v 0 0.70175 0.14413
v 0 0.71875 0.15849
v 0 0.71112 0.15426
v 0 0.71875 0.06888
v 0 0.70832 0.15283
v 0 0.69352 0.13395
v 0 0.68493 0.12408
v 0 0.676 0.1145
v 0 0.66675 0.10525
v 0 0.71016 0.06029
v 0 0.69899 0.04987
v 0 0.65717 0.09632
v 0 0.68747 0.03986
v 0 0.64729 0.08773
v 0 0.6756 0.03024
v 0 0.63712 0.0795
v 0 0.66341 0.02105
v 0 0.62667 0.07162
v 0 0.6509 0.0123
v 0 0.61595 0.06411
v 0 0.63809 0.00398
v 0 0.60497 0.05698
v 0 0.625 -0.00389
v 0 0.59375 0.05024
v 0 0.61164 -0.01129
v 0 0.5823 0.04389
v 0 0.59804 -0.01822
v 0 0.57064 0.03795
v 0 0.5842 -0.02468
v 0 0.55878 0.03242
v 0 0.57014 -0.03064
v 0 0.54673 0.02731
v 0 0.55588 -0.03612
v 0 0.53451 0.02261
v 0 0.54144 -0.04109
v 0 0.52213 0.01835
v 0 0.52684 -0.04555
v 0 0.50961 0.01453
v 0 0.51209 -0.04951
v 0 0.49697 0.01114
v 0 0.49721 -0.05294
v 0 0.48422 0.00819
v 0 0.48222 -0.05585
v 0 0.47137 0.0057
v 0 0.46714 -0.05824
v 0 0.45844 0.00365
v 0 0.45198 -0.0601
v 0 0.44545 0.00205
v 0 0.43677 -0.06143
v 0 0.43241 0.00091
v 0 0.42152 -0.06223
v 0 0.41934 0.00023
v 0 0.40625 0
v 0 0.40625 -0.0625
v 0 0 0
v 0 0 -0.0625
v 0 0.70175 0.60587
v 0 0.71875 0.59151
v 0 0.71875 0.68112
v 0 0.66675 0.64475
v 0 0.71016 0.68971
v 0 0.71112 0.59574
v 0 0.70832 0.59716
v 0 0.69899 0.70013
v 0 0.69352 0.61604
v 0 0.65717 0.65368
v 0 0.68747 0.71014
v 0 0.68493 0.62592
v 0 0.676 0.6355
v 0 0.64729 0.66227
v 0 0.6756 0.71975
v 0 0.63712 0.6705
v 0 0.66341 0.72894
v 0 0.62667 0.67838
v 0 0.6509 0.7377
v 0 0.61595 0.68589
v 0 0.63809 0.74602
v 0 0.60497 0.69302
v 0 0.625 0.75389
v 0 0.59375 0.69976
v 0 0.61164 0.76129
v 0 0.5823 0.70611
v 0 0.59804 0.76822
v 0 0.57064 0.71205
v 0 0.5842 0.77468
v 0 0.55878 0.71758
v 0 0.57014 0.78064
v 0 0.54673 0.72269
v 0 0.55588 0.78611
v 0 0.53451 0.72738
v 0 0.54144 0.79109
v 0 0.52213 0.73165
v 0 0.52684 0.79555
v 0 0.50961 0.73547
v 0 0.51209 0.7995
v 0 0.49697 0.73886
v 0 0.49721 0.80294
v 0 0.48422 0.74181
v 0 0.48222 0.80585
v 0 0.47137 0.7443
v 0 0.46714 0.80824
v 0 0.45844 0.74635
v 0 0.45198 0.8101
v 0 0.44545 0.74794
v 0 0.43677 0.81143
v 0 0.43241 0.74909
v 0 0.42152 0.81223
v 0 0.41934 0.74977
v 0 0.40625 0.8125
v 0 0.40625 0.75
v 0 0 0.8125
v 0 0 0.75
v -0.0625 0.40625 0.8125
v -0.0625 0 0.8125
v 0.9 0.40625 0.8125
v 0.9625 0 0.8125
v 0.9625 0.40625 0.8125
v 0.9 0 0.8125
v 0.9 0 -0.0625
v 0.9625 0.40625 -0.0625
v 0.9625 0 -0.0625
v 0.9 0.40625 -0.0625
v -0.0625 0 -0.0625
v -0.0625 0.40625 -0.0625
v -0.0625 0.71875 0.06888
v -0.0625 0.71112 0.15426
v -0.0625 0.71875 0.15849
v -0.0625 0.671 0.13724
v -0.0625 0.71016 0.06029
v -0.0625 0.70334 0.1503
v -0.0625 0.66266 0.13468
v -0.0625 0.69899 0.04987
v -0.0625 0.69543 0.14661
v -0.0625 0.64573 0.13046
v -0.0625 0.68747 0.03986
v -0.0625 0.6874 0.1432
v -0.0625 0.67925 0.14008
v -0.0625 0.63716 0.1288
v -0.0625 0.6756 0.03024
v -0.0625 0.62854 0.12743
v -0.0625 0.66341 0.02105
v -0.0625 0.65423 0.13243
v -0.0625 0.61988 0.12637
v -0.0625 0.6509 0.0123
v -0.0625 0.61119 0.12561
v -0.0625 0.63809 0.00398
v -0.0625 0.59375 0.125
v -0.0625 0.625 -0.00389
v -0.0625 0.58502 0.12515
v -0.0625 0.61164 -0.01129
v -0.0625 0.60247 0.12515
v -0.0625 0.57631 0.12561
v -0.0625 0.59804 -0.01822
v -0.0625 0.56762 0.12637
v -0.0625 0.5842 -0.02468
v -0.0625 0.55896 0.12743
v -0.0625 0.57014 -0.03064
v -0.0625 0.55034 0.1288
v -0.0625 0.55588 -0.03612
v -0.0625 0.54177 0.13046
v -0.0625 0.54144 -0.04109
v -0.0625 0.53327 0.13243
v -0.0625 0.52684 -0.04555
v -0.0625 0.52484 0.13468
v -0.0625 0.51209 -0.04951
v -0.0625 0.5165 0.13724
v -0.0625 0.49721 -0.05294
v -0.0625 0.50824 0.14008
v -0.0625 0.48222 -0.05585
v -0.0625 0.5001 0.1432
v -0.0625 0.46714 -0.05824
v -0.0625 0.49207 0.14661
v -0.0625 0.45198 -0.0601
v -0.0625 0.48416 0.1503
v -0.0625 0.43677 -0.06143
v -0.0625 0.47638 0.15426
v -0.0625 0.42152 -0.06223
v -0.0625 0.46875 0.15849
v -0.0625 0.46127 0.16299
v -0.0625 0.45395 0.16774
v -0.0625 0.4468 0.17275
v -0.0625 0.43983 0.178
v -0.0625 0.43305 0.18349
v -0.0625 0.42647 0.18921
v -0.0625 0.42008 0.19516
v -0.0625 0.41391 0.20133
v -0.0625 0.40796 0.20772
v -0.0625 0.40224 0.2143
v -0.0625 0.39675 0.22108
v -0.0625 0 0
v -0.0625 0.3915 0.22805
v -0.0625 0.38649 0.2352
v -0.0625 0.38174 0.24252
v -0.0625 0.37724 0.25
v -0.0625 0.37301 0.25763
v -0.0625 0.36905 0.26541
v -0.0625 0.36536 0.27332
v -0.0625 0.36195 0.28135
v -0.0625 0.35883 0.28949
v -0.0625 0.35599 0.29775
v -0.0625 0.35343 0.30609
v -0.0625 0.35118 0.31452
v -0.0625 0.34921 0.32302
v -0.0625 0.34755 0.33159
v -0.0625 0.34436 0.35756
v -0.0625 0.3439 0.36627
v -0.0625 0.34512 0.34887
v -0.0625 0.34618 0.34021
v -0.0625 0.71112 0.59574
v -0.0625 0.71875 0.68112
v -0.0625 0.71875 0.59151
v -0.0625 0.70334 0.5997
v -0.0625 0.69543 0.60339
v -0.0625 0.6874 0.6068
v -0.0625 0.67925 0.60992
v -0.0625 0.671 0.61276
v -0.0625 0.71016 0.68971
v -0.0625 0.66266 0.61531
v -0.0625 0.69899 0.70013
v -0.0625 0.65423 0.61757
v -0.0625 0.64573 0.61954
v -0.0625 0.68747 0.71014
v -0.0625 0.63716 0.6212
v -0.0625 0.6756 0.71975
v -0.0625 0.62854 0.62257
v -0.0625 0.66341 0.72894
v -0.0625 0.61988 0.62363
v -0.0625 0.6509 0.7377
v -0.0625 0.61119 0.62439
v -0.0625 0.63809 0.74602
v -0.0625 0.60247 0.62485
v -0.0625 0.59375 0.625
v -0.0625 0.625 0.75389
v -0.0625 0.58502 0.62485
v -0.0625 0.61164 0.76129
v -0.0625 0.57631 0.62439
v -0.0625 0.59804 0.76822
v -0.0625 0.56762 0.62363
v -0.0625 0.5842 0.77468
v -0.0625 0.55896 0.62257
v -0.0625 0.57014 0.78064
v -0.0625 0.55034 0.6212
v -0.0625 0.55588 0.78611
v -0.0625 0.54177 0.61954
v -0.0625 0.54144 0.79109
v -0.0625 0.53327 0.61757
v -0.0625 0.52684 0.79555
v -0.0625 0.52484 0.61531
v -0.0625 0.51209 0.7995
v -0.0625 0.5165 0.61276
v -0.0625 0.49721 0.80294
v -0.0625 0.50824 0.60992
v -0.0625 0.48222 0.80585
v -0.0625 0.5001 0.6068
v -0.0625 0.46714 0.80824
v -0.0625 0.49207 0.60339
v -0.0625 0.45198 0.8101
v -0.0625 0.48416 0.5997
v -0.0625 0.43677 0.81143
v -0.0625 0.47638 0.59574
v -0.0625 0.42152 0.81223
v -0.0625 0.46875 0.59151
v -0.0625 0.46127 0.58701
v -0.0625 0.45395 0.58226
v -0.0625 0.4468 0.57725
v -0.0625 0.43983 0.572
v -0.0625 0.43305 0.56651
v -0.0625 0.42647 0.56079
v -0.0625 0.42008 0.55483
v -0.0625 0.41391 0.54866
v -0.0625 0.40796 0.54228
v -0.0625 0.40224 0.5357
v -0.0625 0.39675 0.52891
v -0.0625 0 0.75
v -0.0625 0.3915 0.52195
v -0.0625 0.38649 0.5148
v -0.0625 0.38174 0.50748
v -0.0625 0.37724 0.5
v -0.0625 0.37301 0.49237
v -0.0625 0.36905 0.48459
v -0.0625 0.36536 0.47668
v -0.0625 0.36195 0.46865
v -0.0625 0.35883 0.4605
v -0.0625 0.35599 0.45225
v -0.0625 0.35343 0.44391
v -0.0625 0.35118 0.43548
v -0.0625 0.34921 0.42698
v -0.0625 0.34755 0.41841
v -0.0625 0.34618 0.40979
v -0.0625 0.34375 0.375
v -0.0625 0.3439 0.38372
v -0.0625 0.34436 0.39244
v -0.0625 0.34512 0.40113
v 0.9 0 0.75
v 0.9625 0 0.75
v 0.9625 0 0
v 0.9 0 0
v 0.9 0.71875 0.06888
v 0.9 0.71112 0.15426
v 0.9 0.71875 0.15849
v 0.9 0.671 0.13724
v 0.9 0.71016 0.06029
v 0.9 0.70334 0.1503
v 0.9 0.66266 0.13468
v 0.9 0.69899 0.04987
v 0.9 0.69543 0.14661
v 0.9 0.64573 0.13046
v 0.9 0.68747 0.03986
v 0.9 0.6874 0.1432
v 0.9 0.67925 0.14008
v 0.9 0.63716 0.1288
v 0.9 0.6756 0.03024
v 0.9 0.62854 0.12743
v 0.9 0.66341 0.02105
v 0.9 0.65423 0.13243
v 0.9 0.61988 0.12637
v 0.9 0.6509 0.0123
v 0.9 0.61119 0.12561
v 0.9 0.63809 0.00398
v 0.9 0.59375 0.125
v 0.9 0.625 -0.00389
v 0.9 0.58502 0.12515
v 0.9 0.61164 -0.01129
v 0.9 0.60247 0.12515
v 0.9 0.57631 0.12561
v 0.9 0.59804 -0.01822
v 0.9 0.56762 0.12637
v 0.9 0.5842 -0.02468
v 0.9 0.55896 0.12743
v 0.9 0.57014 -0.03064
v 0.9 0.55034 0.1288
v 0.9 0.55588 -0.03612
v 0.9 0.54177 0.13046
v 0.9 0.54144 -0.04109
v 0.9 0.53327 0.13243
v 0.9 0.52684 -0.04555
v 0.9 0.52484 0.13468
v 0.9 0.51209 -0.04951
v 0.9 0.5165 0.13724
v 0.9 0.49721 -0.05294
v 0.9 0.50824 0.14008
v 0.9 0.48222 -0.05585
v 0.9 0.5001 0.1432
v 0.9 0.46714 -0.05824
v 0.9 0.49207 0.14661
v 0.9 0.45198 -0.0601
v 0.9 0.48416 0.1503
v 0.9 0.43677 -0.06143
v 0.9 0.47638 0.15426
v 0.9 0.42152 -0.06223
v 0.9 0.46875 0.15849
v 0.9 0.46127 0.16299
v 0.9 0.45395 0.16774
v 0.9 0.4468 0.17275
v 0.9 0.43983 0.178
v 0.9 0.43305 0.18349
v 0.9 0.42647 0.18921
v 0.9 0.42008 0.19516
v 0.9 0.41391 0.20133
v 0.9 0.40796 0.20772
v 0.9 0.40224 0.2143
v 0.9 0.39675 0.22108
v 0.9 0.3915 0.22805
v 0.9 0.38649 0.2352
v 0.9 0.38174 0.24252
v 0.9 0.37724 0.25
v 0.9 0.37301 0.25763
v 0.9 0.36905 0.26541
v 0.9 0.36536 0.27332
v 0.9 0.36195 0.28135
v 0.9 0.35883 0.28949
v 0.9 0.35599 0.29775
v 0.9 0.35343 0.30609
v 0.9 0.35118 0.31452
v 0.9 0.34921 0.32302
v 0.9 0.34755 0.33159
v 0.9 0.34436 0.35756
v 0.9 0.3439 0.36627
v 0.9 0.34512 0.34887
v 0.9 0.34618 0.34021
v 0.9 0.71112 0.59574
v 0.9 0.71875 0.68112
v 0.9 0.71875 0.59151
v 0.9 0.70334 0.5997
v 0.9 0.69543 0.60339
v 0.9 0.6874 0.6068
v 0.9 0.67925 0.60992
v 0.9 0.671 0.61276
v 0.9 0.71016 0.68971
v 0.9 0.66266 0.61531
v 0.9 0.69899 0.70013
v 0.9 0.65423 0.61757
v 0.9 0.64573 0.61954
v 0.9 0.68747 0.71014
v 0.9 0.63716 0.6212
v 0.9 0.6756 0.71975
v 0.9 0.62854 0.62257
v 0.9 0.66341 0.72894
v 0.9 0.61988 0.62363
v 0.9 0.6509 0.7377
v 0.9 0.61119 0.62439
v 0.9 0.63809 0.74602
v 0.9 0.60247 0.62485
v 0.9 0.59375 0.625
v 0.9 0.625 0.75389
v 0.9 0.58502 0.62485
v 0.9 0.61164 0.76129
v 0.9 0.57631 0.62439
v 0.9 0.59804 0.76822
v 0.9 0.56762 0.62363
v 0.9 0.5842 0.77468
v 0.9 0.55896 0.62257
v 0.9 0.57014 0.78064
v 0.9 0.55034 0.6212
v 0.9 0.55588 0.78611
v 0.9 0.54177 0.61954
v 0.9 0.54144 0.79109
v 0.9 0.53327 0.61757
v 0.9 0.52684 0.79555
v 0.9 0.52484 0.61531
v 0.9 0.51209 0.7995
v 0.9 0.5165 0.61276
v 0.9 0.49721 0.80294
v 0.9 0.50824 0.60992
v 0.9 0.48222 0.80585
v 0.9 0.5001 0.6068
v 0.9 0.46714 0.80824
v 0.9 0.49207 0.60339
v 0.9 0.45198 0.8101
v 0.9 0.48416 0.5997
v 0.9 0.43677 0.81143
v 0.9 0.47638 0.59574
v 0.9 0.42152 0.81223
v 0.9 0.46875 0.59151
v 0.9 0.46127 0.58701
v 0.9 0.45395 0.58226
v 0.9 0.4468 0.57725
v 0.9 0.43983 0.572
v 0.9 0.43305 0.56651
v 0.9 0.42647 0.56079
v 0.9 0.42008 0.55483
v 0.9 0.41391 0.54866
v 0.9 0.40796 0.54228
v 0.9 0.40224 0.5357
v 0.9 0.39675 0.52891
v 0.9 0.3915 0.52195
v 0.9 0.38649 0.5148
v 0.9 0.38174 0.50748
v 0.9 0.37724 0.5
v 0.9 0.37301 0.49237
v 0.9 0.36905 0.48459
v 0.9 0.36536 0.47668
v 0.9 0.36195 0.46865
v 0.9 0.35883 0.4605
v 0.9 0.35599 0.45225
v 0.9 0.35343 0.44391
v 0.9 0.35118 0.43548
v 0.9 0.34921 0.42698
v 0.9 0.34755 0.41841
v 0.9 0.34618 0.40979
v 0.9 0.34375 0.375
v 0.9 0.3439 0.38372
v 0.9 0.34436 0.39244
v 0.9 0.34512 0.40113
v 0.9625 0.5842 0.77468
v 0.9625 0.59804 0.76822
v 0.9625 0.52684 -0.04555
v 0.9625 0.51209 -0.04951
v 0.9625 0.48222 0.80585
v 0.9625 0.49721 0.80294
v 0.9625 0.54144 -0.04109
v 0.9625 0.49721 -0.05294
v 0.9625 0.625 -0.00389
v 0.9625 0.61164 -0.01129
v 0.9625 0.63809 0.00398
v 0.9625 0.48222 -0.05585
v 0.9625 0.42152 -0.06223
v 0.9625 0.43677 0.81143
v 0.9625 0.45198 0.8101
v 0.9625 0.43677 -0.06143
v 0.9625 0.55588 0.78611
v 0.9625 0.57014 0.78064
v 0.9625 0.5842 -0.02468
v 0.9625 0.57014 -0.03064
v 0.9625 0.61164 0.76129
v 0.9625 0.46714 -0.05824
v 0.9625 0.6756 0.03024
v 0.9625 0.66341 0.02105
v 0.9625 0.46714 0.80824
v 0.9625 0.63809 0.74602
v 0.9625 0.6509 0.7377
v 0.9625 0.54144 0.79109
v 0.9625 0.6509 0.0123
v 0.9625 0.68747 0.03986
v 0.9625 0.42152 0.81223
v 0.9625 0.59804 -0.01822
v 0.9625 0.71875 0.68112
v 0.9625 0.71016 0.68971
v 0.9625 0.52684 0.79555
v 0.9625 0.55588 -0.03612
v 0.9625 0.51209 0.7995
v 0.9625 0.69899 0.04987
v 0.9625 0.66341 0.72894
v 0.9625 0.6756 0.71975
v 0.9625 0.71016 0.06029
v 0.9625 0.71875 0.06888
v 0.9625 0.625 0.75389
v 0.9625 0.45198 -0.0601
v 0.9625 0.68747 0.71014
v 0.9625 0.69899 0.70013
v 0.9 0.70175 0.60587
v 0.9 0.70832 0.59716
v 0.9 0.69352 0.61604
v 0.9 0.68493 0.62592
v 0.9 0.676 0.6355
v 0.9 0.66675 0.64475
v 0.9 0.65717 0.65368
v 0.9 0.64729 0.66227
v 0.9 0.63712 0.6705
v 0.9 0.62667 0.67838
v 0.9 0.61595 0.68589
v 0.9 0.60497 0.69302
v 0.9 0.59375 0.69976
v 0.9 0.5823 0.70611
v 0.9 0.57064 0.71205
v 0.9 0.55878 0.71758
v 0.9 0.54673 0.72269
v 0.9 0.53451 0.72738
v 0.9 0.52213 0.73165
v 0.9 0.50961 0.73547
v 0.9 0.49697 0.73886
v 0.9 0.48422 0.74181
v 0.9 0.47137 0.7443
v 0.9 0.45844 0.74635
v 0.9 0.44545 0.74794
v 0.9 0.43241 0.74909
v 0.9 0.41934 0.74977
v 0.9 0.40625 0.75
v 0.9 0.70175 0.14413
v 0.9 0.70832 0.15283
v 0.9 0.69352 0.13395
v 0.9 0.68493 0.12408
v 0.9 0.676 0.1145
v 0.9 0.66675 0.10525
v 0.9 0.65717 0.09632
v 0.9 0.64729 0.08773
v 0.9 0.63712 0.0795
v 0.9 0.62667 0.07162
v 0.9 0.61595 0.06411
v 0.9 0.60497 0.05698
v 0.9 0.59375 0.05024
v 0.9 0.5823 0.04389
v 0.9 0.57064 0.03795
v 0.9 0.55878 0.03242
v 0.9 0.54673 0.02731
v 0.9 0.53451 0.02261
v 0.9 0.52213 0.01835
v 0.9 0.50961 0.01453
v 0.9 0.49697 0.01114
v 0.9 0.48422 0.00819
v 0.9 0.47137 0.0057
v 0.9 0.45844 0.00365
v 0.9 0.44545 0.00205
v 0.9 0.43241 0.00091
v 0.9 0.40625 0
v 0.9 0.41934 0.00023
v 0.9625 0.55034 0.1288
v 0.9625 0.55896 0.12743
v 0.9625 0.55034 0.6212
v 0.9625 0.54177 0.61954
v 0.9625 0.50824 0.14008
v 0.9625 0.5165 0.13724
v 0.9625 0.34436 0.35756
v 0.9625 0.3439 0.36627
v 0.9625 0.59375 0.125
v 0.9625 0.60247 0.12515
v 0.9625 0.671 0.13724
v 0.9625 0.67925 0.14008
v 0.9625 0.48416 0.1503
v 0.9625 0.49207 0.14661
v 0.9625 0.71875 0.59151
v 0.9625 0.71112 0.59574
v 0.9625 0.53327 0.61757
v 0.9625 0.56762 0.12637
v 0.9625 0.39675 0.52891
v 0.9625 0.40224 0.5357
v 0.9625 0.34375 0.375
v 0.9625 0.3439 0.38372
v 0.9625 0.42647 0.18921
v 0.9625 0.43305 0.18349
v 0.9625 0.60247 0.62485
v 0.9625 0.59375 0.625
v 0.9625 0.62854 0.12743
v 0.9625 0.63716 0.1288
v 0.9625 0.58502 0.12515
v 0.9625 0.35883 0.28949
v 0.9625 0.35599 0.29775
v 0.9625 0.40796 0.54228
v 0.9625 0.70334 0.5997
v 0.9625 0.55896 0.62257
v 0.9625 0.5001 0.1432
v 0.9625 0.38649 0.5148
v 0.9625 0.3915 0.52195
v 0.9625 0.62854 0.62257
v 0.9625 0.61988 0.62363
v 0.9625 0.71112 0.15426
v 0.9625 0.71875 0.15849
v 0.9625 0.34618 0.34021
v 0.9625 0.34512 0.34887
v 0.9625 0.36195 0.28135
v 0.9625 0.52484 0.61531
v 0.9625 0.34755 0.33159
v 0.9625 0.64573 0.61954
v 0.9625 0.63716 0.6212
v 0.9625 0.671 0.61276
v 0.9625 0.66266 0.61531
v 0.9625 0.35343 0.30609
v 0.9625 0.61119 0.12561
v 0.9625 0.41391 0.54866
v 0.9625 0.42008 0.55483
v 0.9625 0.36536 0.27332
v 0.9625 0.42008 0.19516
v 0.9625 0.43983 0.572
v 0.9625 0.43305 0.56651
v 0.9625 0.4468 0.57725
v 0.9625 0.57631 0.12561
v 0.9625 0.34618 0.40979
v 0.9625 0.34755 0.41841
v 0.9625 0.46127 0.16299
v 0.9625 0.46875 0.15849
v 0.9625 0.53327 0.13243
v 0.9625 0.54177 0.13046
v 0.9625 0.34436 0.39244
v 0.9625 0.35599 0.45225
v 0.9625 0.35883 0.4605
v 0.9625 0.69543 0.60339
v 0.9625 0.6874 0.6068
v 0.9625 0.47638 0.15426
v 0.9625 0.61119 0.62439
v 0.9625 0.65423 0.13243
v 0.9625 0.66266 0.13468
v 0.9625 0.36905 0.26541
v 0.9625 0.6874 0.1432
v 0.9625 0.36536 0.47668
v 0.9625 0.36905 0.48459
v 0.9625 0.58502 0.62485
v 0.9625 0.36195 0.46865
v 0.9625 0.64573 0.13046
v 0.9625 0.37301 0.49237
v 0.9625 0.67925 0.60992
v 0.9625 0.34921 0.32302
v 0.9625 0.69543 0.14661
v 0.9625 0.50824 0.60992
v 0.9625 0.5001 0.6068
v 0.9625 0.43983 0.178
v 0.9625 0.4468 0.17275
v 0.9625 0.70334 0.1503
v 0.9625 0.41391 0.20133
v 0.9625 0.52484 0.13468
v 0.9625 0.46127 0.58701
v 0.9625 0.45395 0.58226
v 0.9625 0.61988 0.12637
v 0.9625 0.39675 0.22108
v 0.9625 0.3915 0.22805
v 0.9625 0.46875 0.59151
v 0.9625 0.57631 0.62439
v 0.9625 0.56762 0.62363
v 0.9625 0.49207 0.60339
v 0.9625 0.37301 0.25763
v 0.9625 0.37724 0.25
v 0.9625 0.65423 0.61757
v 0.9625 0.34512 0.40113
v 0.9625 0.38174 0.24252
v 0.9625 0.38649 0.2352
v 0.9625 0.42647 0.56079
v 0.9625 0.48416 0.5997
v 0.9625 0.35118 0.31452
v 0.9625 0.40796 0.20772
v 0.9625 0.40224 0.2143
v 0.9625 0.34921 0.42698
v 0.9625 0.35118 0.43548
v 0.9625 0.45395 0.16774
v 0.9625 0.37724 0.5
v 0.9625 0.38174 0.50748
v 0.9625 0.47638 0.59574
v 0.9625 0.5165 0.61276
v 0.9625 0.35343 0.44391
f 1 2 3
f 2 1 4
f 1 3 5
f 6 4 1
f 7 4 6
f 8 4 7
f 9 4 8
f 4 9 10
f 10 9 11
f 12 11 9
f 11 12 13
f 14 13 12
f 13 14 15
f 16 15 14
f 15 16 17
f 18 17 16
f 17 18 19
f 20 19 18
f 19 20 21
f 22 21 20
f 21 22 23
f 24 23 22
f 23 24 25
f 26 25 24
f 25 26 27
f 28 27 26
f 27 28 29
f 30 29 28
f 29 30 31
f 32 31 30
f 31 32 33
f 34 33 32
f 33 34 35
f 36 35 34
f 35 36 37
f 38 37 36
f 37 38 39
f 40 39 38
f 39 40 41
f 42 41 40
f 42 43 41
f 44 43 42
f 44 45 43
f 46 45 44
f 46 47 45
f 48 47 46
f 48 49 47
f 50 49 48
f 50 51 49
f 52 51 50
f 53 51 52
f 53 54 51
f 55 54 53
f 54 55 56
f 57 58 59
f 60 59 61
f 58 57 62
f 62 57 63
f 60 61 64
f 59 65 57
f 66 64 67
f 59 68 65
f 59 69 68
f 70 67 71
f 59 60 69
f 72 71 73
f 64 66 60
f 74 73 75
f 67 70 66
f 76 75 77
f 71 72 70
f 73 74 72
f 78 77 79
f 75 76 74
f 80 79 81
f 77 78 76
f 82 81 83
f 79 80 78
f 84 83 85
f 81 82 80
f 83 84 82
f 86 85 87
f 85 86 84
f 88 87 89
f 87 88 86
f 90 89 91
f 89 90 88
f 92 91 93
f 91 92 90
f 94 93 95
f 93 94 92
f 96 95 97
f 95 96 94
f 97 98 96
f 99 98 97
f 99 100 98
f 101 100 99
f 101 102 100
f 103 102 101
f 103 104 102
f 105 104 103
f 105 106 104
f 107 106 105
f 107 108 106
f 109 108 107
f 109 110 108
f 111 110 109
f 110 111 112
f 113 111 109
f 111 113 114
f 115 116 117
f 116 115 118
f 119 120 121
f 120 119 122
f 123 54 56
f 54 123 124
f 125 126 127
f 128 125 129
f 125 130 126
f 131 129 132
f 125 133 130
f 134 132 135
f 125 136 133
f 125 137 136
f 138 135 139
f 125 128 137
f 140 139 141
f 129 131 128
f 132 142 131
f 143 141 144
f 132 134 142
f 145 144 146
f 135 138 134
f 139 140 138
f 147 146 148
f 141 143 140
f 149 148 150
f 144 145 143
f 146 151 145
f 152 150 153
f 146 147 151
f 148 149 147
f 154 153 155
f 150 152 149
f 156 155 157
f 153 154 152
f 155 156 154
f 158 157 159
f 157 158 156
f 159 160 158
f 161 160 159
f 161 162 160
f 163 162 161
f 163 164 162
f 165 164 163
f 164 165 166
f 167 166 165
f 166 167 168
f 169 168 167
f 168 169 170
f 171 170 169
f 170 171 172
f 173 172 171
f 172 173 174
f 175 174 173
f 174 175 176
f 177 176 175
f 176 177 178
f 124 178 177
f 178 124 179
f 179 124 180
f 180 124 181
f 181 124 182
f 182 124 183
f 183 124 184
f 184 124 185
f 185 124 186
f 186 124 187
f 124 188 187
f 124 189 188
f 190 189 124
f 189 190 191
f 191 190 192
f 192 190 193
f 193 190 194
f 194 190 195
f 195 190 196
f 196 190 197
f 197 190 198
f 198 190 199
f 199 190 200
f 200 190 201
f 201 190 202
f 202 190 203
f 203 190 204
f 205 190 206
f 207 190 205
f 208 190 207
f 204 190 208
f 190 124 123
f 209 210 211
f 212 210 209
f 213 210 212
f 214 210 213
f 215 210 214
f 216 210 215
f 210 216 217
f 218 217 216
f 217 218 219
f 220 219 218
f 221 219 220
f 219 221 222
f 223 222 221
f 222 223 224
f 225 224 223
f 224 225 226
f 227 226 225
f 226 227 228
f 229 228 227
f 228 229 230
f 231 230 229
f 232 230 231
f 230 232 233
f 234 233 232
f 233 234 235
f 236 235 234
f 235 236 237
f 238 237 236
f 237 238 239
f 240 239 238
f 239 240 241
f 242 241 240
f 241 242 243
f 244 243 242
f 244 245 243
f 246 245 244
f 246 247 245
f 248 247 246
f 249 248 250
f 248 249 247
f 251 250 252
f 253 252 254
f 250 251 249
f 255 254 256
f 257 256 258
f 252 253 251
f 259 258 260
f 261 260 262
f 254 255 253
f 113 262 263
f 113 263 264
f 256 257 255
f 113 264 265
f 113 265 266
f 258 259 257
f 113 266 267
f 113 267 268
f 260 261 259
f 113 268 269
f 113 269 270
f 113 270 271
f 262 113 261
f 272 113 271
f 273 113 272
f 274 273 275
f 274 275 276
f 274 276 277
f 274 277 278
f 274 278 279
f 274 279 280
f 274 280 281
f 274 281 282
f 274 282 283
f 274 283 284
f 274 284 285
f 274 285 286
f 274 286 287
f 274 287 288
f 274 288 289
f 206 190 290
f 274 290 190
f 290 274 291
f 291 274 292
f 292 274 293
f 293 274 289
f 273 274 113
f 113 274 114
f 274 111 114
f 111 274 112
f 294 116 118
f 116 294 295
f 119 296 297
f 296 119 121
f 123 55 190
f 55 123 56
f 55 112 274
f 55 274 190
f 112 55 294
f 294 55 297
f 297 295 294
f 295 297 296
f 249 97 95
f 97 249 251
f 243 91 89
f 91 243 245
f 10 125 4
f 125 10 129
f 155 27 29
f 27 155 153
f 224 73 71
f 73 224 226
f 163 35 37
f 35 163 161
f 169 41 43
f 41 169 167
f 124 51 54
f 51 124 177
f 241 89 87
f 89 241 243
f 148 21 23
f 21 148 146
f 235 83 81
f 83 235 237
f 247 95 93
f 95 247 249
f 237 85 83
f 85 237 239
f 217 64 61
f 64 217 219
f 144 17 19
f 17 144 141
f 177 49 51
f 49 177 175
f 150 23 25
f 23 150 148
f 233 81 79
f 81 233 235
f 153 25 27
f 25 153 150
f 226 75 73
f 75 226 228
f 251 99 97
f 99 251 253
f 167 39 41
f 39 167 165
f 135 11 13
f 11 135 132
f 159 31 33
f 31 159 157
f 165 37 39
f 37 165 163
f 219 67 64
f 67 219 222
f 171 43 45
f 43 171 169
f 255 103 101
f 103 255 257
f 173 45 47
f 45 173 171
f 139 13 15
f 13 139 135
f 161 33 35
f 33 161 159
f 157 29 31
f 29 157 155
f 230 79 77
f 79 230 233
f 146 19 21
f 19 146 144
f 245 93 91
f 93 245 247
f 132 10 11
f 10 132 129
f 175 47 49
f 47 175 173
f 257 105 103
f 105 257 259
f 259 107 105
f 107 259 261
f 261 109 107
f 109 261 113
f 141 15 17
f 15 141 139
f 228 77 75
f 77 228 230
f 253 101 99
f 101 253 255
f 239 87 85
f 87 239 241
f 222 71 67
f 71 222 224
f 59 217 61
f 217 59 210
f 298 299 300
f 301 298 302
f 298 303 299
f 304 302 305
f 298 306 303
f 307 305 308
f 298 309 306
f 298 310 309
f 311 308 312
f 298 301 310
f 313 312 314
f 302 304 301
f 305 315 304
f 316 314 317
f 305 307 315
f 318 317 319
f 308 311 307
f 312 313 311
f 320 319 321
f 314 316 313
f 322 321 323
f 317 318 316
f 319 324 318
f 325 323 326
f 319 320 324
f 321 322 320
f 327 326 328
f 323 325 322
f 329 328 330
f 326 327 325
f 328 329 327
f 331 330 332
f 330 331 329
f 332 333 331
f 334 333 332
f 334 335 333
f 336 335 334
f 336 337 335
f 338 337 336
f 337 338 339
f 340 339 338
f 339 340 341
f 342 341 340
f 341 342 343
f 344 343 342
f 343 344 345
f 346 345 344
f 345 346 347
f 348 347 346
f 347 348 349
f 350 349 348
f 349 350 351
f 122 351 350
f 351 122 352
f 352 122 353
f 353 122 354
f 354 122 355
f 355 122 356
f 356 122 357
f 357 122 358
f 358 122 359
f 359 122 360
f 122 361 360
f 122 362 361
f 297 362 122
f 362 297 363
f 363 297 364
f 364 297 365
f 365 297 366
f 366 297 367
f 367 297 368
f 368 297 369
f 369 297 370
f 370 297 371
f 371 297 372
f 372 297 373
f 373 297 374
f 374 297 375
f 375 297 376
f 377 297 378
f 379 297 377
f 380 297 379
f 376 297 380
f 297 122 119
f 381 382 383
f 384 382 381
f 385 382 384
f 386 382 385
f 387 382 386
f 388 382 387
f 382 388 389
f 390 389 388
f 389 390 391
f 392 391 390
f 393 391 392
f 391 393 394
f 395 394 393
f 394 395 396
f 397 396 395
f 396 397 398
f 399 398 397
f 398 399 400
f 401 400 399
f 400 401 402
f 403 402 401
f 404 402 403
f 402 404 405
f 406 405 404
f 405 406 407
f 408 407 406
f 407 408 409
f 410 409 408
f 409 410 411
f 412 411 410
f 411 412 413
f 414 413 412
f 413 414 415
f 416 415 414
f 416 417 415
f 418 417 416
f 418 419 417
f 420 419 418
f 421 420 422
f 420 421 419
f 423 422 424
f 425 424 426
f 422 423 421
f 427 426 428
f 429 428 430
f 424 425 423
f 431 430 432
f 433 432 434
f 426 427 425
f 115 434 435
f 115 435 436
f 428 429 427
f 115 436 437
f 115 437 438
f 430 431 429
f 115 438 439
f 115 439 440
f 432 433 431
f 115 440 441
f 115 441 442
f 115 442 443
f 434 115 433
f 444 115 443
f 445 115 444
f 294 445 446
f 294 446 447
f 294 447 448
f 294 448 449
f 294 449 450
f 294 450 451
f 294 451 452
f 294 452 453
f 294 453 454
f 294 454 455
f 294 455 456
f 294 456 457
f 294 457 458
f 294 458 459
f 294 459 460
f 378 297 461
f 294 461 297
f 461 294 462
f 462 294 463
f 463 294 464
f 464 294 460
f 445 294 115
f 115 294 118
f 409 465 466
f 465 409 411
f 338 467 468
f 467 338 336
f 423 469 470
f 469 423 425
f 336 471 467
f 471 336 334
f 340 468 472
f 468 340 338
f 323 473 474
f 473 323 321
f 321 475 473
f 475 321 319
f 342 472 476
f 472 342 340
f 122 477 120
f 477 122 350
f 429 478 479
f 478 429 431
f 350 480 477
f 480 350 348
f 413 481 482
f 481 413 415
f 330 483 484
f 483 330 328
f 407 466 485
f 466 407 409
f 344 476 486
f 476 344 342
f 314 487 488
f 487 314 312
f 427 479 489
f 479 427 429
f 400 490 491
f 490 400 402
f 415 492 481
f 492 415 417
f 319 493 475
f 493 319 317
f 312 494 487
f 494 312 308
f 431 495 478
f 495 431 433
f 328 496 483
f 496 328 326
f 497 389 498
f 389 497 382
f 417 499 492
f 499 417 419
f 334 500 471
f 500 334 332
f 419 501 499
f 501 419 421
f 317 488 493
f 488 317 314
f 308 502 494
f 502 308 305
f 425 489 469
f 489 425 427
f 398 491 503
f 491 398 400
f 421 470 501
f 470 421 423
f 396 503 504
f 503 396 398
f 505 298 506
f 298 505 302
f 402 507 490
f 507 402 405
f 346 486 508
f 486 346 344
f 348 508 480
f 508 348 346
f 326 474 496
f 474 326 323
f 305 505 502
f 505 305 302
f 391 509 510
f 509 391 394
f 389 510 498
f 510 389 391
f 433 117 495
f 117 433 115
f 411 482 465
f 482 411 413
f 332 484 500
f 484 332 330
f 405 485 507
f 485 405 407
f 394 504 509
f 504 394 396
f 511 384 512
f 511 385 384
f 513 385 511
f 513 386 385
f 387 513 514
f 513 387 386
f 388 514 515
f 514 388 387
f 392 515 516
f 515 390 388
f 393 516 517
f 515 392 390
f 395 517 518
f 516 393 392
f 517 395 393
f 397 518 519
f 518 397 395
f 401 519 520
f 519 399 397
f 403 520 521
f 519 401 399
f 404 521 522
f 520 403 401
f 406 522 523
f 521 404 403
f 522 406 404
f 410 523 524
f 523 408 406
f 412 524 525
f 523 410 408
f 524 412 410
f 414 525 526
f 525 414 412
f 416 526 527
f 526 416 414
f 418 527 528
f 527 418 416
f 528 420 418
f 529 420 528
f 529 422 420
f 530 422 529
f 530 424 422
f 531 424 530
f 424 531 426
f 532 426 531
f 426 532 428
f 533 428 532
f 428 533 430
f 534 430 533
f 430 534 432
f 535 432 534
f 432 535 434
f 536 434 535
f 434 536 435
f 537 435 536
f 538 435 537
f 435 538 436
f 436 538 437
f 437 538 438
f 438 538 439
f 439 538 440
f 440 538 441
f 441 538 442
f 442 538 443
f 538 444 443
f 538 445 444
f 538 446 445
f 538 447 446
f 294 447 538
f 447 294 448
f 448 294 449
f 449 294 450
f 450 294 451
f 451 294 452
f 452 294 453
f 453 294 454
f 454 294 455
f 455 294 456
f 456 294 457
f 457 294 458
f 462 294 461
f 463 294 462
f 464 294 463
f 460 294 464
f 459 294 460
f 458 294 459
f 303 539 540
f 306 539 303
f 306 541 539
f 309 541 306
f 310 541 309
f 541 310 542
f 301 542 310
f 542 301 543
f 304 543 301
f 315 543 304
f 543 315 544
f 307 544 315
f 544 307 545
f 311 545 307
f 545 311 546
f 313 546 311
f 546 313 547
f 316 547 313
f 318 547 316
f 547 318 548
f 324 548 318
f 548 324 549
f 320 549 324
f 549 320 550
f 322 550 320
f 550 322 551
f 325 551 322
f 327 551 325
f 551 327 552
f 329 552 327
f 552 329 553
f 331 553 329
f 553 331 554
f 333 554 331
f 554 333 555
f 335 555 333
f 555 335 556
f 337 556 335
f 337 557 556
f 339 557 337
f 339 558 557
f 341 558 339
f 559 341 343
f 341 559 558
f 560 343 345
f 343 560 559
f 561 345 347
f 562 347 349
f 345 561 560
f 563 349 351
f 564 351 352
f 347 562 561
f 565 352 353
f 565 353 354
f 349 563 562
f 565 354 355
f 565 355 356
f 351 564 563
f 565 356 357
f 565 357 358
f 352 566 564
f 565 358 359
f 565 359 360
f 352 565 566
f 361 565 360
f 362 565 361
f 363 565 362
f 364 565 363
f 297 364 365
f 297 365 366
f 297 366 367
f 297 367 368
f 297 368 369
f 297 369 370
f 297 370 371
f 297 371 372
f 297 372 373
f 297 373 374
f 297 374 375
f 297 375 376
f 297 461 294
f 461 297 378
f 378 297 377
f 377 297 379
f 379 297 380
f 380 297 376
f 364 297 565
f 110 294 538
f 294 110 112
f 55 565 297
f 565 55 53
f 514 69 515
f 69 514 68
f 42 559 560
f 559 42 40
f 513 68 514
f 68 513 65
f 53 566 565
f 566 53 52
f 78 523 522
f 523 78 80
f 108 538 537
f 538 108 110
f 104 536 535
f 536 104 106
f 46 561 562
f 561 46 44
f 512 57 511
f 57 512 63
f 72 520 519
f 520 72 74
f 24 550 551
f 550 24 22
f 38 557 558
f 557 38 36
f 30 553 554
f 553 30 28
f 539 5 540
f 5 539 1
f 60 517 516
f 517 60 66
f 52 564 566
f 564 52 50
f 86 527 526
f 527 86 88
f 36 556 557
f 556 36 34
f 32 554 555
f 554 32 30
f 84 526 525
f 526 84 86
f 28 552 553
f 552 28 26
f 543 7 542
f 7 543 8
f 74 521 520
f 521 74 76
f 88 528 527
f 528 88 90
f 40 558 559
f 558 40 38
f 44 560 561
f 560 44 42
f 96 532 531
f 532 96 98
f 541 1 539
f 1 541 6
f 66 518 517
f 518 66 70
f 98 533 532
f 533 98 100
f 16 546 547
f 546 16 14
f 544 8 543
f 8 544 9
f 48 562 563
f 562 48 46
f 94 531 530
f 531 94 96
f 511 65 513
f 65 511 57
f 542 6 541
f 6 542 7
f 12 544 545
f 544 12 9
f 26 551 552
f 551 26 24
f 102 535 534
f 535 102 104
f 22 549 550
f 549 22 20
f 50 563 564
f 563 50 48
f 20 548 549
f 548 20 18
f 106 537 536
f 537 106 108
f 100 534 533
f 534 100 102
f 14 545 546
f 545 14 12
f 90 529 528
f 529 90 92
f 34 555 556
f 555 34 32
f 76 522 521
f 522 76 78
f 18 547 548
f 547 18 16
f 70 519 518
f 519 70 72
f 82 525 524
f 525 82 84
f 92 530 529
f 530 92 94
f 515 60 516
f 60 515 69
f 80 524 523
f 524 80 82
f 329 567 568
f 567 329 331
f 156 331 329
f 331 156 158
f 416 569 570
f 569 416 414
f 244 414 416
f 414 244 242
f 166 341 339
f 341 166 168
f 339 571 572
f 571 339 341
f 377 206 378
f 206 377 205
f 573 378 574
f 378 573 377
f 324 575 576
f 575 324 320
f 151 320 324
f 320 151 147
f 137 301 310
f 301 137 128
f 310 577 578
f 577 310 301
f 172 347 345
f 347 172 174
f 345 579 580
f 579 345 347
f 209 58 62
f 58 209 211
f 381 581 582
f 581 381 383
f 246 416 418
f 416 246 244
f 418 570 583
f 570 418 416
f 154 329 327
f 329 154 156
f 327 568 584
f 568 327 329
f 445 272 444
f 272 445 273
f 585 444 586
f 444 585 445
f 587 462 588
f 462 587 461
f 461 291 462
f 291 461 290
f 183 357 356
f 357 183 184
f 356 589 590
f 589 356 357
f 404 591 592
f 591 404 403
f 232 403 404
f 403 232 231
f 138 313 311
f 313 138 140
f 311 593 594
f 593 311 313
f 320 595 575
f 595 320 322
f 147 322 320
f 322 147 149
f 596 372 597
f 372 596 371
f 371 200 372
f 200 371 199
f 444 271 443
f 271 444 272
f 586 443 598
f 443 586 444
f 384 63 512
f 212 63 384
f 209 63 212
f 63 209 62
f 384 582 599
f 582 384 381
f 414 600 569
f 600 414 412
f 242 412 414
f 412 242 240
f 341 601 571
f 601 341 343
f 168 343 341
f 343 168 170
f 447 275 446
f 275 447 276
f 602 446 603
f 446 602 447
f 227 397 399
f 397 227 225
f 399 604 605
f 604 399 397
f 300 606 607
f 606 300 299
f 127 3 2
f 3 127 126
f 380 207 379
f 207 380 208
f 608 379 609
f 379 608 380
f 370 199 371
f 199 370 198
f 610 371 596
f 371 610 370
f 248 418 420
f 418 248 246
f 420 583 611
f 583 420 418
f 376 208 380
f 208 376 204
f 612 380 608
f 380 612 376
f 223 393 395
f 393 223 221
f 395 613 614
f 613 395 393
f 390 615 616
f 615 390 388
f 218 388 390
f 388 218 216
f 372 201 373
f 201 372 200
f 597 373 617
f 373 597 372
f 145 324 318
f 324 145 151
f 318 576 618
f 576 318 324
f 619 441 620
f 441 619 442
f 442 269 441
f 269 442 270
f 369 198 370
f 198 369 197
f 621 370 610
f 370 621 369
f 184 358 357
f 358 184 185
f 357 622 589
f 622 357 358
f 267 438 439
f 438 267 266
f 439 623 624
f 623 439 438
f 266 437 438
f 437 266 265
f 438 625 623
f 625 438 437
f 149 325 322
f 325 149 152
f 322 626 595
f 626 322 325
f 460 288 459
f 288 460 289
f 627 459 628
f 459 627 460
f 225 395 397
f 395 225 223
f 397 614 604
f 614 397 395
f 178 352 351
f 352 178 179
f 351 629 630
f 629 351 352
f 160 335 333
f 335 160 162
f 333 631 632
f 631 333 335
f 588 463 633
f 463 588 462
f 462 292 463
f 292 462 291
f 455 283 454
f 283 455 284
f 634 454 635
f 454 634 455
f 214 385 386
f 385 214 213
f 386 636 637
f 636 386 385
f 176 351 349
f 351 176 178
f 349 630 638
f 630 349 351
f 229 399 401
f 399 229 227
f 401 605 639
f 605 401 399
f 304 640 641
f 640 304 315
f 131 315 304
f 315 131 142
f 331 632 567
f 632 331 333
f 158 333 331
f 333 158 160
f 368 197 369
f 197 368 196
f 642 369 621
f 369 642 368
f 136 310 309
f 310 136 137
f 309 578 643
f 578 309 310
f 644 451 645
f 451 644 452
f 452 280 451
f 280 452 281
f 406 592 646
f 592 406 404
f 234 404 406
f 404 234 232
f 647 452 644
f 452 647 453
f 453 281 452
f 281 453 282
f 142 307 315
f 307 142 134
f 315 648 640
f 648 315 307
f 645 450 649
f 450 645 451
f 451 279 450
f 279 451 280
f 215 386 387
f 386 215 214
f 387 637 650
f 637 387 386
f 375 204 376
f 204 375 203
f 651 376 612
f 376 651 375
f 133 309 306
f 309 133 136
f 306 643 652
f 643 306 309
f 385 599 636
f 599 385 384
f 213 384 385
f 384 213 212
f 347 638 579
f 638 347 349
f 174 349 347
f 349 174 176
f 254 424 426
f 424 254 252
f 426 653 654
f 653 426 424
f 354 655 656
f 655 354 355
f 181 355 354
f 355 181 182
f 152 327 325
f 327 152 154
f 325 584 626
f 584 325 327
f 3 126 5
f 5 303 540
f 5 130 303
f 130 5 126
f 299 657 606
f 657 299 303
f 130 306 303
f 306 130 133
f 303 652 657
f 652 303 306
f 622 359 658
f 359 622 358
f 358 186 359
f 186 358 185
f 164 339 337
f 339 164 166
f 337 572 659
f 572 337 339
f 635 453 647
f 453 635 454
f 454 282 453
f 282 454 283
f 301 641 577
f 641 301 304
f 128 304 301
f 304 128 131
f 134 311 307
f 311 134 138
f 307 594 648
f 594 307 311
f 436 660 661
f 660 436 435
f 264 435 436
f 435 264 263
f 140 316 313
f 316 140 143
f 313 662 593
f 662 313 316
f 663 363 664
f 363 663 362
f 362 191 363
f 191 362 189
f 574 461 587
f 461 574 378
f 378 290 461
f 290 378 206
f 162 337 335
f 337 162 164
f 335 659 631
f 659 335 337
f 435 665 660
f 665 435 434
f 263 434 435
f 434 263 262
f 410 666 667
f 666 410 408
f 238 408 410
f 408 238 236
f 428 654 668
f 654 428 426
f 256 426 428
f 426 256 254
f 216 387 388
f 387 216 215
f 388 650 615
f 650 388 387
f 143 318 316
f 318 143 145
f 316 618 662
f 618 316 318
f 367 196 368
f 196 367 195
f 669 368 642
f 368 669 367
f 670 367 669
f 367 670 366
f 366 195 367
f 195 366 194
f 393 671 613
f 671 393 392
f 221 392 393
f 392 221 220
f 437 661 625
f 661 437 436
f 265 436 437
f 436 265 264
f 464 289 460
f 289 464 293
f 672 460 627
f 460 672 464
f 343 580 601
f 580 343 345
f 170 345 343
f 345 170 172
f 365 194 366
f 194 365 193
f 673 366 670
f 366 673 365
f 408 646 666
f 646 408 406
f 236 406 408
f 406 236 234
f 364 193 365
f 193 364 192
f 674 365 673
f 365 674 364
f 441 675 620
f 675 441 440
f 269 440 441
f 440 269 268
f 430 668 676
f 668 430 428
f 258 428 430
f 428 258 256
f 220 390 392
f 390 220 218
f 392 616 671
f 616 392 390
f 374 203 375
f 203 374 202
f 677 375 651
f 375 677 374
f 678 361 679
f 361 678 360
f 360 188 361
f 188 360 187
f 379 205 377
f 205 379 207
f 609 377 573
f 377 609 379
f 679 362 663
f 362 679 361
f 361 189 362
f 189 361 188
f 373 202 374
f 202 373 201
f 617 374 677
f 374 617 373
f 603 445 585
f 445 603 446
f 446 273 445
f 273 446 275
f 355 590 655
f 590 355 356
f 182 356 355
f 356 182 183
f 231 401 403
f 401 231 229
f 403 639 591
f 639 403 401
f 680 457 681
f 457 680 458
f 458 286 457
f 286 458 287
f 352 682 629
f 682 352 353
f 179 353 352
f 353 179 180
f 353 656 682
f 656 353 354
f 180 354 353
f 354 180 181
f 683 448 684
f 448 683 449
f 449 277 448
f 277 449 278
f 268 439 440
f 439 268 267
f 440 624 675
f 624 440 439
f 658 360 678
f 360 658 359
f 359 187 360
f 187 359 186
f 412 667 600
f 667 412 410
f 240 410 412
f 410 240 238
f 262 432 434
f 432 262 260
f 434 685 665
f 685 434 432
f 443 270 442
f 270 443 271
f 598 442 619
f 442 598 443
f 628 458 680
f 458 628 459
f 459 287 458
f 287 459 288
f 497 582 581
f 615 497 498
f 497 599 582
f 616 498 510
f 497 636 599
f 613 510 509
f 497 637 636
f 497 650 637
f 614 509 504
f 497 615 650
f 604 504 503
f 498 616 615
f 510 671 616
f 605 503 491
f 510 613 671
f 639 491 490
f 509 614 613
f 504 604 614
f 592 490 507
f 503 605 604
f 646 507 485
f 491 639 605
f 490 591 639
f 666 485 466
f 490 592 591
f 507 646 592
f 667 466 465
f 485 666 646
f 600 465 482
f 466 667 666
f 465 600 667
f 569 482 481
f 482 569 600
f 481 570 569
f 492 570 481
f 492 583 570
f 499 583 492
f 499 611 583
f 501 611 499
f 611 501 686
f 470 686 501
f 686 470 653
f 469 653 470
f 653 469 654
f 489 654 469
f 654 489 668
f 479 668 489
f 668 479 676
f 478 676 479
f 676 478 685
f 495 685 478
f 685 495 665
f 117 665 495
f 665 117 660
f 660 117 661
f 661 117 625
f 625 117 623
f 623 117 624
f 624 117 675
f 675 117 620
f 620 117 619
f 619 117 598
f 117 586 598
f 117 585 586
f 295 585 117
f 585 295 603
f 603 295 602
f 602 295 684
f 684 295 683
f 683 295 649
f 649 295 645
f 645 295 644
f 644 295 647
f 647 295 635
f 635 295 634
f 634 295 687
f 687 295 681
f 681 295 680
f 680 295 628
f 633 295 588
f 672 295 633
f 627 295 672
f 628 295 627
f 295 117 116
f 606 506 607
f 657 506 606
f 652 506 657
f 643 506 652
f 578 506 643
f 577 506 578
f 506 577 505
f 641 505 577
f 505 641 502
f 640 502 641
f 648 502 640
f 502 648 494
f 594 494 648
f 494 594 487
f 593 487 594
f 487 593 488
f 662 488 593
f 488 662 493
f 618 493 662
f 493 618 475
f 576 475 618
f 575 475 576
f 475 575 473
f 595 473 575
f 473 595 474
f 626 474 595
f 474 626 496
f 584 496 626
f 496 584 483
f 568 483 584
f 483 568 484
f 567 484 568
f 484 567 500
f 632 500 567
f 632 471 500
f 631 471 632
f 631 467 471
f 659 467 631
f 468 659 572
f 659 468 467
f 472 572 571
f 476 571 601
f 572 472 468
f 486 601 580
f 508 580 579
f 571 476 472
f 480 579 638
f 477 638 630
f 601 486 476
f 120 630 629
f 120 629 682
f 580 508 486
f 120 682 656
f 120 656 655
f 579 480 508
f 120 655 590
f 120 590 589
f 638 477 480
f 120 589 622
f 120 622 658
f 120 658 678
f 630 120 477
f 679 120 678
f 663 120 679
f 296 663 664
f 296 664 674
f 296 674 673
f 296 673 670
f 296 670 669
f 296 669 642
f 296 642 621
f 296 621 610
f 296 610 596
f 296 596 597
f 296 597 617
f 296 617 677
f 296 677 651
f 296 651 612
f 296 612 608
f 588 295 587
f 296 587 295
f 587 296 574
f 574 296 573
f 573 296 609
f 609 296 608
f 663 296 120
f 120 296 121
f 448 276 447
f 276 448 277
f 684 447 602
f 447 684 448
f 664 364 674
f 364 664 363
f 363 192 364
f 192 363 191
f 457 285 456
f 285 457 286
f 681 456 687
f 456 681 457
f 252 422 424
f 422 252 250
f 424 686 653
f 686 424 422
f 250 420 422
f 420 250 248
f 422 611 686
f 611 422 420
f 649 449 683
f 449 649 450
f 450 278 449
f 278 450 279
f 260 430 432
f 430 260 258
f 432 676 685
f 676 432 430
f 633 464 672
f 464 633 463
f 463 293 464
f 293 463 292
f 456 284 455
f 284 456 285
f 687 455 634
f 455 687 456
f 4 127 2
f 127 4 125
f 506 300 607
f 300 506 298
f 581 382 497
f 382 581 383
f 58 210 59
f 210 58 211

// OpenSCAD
z = 3/4;
// x = 7/8; // about 1/32 too tight
x = 0.9;
y = 1/2 - 3/32;
rod=3/8;
rod_clearance = 1/8;
lip=1/16;

_lipz = z+2*lip;
_rod_hole = rod + rod_clearance;

intersection(){
  translate([-1*lip,0,-1*lip]){
    cube([x+2*lip, 11/16+1/32, z+2*lip]);
  }
difference(){
  union(){
    // middle
    cube([x,y,z]);
    translate([0,y,z/2]){
      rotate(a=[0,90,0]){
        cylinder(h=x, r=z/2, center=false, $fn=180);
      }
    }
    // right lip
    translate([-1*lip,0,-1*lip]){
      cube([lip,y,_lipz]);
      translate([0,y,_lipz/2]){
        rotate(a=[0,90,0]){
          cylinder(h=lip, r=_lipz/2, center=false, $fn=180);
        }
      }
    }
    // left lip
    translate([x,0,-1*lip]){
      cube([lip,y,_lipz]);
      translate([0,y,_lipz/2]){
        rotate(a=[0,90,0]){
          cylinder(h=lip, r=_lipz/2, center=false, $fn=180);
        }
      }
    }
  }
  // flatten back by subtracting a cube
  translate([-1*lip,-1*(y-_lipz/4),0]){
    cube([x+lip*2,y-_lipz/4,z]);
  }
  // lock pin hole
  translate([-1 * lip,(y+z/2) - rod/2, z/2]){
    rotate(a=[0,90,0]){
      cylinder(h=x+2*lip, r=_rod_hole/2, center=false, $fn=180);
    }
  }
}
}
